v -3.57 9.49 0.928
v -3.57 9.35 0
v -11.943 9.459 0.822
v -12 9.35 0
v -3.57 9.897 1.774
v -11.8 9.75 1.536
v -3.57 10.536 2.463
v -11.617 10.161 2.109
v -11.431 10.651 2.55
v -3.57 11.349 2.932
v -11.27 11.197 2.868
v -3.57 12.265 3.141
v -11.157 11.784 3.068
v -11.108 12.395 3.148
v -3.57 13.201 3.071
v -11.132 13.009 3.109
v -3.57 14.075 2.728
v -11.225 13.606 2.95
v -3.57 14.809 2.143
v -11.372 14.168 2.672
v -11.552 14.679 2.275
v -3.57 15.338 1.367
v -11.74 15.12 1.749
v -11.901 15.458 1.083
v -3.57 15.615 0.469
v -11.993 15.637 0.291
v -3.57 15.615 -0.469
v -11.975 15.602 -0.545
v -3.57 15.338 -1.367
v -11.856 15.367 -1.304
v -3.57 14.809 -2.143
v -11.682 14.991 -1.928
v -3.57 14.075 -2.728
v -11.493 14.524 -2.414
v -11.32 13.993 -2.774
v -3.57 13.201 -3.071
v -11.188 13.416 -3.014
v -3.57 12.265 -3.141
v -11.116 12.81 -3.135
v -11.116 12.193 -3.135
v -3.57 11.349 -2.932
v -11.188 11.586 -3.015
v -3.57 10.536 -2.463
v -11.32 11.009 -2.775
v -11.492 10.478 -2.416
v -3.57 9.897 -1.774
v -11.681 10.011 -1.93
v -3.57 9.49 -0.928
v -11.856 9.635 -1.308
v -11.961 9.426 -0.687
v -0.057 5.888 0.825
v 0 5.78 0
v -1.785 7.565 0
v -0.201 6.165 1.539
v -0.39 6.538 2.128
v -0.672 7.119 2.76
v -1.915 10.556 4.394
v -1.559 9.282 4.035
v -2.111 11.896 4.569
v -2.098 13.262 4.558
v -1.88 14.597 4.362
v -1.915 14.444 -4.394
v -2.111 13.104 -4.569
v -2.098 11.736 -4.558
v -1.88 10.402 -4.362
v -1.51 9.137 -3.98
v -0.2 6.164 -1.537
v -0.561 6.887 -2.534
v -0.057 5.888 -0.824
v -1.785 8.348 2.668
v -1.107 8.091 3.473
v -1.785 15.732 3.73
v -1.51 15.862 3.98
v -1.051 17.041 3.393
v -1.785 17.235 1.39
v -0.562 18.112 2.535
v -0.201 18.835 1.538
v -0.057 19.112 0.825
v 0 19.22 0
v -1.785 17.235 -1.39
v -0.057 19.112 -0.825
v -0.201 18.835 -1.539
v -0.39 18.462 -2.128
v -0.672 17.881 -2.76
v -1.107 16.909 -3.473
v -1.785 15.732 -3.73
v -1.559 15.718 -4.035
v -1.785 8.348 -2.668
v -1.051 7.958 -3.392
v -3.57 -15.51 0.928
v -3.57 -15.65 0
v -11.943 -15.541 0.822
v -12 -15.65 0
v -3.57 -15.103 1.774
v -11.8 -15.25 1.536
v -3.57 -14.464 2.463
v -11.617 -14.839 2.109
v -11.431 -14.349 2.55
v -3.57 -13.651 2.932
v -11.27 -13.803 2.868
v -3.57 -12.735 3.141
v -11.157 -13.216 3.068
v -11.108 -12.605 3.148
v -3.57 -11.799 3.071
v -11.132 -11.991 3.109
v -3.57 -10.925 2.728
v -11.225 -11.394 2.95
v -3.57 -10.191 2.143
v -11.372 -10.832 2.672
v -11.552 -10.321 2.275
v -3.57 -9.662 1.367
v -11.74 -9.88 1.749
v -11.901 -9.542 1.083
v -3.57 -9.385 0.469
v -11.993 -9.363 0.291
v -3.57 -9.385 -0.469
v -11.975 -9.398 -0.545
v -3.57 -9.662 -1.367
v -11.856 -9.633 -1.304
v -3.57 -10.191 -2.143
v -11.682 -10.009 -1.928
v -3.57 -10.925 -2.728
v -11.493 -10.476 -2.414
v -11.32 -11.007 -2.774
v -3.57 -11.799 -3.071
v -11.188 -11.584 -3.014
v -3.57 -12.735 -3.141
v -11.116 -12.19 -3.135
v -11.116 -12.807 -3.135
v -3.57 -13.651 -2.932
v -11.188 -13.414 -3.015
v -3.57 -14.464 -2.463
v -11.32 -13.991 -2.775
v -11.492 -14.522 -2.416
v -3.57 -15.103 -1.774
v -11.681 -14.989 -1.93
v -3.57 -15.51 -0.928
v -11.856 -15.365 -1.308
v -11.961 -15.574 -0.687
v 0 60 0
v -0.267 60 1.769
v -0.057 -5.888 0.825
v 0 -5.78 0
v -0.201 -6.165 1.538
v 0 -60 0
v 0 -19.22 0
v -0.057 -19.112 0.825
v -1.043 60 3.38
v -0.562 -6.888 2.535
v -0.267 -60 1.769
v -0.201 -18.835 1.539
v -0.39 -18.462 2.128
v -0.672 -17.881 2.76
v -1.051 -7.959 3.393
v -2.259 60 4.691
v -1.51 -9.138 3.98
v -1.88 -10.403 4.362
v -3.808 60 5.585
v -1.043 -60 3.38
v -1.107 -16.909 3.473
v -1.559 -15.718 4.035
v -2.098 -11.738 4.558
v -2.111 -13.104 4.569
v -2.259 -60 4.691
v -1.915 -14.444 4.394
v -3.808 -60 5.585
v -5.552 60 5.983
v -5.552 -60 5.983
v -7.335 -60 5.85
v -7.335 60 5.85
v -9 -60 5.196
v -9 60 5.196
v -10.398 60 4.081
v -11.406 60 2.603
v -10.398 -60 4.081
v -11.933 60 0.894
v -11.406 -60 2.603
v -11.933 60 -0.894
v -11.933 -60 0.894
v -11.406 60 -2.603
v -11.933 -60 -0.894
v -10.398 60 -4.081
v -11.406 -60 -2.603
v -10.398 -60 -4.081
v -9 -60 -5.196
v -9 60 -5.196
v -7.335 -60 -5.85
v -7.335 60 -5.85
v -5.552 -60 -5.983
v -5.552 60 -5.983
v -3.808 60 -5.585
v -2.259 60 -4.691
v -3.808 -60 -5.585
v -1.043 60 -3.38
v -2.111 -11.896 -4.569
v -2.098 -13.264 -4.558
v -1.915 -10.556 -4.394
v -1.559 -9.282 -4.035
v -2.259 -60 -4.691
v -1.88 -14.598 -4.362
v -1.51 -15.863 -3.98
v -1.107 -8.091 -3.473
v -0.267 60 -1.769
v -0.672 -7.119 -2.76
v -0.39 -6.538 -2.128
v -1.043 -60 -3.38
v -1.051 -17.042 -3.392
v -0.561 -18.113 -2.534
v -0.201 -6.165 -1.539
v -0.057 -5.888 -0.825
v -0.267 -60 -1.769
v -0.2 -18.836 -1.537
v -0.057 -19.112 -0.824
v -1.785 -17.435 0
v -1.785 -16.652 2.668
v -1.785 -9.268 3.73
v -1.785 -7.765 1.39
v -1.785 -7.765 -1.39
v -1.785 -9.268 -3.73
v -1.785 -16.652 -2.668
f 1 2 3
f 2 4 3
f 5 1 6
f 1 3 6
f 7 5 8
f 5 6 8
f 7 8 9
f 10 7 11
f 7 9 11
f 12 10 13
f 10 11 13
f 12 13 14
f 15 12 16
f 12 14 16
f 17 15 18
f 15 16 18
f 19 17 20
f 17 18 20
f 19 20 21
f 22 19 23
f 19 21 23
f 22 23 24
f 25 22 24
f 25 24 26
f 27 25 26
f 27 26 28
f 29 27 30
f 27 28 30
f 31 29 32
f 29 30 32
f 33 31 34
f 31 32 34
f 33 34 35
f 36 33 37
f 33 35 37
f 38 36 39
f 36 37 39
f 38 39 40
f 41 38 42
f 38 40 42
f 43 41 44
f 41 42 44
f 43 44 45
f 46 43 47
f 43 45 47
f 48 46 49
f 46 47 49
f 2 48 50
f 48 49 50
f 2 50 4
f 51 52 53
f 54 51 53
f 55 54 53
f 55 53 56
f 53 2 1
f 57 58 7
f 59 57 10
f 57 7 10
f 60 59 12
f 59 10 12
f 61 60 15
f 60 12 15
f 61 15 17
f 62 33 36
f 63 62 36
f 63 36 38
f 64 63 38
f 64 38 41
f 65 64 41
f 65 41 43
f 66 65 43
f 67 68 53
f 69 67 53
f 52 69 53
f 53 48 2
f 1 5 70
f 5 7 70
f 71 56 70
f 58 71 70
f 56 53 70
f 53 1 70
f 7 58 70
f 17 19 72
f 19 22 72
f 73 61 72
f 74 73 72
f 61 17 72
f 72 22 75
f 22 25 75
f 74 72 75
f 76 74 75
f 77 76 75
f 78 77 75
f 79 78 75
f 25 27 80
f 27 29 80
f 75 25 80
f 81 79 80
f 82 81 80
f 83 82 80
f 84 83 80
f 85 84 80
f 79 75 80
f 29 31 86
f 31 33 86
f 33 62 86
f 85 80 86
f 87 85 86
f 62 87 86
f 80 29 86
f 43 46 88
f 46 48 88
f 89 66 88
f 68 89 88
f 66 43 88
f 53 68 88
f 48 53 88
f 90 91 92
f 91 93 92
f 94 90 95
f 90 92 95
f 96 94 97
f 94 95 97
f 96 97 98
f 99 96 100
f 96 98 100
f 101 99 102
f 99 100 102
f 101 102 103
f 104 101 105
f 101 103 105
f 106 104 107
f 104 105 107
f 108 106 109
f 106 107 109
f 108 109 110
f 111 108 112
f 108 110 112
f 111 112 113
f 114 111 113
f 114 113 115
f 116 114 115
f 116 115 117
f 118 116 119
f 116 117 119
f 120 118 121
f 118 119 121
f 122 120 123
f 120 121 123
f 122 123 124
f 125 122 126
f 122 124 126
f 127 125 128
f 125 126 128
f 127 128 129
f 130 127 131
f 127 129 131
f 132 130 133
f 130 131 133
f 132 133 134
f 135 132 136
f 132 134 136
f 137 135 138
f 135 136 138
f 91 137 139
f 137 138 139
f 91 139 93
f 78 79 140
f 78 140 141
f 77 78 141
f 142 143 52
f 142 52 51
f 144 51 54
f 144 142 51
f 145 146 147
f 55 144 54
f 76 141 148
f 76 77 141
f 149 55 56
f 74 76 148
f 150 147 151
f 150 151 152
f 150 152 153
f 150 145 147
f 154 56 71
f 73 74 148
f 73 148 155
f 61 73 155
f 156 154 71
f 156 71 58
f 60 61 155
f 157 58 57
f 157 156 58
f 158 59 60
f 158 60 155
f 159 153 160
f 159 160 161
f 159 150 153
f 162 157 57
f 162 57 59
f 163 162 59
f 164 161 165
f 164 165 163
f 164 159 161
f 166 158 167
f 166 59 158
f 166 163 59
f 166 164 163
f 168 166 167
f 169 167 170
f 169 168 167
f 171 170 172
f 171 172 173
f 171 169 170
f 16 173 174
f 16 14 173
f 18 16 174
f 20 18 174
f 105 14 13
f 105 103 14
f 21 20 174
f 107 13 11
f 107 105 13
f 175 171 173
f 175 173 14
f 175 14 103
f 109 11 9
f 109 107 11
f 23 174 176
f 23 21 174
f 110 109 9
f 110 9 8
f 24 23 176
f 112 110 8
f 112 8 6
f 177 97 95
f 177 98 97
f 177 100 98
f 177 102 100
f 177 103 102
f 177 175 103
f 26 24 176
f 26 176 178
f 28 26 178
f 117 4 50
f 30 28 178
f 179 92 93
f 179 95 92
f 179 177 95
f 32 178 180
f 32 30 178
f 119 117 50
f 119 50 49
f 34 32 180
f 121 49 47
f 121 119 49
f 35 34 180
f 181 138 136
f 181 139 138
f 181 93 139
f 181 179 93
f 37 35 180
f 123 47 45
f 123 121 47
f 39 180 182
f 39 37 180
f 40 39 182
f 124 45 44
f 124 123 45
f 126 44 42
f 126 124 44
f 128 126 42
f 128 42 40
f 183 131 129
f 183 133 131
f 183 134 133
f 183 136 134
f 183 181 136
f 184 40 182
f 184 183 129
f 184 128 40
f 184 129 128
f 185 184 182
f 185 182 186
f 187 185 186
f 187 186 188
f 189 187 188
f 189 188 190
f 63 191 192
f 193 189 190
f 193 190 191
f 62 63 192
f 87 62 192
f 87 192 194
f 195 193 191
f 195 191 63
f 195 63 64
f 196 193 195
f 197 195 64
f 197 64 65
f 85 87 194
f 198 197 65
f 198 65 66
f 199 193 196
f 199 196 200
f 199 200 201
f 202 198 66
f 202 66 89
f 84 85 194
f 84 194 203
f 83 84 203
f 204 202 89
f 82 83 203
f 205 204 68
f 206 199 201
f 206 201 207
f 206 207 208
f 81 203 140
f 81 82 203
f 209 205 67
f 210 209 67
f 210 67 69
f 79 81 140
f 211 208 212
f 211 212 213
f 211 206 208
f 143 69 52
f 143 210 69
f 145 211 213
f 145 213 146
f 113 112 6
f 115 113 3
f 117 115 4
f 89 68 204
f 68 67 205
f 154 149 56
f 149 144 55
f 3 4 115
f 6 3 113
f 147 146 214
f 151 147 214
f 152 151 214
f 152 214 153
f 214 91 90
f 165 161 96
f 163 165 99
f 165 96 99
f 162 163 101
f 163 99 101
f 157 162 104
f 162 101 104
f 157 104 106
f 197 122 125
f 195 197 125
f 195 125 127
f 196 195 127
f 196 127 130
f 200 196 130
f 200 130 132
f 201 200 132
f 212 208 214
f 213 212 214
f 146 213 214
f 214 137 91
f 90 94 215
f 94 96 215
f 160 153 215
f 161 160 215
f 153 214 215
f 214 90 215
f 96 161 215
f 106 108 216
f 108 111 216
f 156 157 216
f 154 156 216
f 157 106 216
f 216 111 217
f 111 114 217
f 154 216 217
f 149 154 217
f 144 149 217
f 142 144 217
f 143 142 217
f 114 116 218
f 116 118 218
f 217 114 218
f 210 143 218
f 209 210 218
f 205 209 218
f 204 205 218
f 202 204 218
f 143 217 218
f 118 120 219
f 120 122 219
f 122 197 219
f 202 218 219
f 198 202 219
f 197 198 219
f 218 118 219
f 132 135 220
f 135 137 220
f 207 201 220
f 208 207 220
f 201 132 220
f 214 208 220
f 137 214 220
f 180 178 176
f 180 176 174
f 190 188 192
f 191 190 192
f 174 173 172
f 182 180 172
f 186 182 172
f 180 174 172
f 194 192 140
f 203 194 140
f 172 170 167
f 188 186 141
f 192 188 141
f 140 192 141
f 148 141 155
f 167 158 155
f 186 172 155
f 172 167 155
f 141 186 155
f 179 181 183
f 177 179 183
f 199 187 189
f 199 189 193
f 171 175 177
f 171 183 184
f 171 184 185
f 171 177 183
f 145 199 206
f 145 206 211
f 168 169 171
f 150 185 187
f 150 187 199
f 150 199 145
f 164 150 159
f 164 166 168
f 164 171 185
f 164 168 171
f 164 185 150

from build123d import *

# Parameters (mm, degrees)
F0_R           = 6
F1_DEPTH       = 60
F3_D           = 6.3
F3_CSINK_D     = 13.44
F3_CSINK_ANGLE = 90


with BuildPart() as f1:
    # F0 (on Front) → F1 (new body, symmetric)
    with BuildSketch(Plane.XZ):
        with Locations((-6, 0)):
            Circle(F0_R)
    extrude(amount=F1_DEPTH, both=True)

    # F3 (through all)
    with Locations(Plane.YZ):
        with Locations((12.5, 0), (-12.5, 0)):
            CounterSinkHole(F3_D / 2, F3_CSINK_D / 2, counter_sink_angle=F3_CSINK_ANGLE)


solid = f1.part
